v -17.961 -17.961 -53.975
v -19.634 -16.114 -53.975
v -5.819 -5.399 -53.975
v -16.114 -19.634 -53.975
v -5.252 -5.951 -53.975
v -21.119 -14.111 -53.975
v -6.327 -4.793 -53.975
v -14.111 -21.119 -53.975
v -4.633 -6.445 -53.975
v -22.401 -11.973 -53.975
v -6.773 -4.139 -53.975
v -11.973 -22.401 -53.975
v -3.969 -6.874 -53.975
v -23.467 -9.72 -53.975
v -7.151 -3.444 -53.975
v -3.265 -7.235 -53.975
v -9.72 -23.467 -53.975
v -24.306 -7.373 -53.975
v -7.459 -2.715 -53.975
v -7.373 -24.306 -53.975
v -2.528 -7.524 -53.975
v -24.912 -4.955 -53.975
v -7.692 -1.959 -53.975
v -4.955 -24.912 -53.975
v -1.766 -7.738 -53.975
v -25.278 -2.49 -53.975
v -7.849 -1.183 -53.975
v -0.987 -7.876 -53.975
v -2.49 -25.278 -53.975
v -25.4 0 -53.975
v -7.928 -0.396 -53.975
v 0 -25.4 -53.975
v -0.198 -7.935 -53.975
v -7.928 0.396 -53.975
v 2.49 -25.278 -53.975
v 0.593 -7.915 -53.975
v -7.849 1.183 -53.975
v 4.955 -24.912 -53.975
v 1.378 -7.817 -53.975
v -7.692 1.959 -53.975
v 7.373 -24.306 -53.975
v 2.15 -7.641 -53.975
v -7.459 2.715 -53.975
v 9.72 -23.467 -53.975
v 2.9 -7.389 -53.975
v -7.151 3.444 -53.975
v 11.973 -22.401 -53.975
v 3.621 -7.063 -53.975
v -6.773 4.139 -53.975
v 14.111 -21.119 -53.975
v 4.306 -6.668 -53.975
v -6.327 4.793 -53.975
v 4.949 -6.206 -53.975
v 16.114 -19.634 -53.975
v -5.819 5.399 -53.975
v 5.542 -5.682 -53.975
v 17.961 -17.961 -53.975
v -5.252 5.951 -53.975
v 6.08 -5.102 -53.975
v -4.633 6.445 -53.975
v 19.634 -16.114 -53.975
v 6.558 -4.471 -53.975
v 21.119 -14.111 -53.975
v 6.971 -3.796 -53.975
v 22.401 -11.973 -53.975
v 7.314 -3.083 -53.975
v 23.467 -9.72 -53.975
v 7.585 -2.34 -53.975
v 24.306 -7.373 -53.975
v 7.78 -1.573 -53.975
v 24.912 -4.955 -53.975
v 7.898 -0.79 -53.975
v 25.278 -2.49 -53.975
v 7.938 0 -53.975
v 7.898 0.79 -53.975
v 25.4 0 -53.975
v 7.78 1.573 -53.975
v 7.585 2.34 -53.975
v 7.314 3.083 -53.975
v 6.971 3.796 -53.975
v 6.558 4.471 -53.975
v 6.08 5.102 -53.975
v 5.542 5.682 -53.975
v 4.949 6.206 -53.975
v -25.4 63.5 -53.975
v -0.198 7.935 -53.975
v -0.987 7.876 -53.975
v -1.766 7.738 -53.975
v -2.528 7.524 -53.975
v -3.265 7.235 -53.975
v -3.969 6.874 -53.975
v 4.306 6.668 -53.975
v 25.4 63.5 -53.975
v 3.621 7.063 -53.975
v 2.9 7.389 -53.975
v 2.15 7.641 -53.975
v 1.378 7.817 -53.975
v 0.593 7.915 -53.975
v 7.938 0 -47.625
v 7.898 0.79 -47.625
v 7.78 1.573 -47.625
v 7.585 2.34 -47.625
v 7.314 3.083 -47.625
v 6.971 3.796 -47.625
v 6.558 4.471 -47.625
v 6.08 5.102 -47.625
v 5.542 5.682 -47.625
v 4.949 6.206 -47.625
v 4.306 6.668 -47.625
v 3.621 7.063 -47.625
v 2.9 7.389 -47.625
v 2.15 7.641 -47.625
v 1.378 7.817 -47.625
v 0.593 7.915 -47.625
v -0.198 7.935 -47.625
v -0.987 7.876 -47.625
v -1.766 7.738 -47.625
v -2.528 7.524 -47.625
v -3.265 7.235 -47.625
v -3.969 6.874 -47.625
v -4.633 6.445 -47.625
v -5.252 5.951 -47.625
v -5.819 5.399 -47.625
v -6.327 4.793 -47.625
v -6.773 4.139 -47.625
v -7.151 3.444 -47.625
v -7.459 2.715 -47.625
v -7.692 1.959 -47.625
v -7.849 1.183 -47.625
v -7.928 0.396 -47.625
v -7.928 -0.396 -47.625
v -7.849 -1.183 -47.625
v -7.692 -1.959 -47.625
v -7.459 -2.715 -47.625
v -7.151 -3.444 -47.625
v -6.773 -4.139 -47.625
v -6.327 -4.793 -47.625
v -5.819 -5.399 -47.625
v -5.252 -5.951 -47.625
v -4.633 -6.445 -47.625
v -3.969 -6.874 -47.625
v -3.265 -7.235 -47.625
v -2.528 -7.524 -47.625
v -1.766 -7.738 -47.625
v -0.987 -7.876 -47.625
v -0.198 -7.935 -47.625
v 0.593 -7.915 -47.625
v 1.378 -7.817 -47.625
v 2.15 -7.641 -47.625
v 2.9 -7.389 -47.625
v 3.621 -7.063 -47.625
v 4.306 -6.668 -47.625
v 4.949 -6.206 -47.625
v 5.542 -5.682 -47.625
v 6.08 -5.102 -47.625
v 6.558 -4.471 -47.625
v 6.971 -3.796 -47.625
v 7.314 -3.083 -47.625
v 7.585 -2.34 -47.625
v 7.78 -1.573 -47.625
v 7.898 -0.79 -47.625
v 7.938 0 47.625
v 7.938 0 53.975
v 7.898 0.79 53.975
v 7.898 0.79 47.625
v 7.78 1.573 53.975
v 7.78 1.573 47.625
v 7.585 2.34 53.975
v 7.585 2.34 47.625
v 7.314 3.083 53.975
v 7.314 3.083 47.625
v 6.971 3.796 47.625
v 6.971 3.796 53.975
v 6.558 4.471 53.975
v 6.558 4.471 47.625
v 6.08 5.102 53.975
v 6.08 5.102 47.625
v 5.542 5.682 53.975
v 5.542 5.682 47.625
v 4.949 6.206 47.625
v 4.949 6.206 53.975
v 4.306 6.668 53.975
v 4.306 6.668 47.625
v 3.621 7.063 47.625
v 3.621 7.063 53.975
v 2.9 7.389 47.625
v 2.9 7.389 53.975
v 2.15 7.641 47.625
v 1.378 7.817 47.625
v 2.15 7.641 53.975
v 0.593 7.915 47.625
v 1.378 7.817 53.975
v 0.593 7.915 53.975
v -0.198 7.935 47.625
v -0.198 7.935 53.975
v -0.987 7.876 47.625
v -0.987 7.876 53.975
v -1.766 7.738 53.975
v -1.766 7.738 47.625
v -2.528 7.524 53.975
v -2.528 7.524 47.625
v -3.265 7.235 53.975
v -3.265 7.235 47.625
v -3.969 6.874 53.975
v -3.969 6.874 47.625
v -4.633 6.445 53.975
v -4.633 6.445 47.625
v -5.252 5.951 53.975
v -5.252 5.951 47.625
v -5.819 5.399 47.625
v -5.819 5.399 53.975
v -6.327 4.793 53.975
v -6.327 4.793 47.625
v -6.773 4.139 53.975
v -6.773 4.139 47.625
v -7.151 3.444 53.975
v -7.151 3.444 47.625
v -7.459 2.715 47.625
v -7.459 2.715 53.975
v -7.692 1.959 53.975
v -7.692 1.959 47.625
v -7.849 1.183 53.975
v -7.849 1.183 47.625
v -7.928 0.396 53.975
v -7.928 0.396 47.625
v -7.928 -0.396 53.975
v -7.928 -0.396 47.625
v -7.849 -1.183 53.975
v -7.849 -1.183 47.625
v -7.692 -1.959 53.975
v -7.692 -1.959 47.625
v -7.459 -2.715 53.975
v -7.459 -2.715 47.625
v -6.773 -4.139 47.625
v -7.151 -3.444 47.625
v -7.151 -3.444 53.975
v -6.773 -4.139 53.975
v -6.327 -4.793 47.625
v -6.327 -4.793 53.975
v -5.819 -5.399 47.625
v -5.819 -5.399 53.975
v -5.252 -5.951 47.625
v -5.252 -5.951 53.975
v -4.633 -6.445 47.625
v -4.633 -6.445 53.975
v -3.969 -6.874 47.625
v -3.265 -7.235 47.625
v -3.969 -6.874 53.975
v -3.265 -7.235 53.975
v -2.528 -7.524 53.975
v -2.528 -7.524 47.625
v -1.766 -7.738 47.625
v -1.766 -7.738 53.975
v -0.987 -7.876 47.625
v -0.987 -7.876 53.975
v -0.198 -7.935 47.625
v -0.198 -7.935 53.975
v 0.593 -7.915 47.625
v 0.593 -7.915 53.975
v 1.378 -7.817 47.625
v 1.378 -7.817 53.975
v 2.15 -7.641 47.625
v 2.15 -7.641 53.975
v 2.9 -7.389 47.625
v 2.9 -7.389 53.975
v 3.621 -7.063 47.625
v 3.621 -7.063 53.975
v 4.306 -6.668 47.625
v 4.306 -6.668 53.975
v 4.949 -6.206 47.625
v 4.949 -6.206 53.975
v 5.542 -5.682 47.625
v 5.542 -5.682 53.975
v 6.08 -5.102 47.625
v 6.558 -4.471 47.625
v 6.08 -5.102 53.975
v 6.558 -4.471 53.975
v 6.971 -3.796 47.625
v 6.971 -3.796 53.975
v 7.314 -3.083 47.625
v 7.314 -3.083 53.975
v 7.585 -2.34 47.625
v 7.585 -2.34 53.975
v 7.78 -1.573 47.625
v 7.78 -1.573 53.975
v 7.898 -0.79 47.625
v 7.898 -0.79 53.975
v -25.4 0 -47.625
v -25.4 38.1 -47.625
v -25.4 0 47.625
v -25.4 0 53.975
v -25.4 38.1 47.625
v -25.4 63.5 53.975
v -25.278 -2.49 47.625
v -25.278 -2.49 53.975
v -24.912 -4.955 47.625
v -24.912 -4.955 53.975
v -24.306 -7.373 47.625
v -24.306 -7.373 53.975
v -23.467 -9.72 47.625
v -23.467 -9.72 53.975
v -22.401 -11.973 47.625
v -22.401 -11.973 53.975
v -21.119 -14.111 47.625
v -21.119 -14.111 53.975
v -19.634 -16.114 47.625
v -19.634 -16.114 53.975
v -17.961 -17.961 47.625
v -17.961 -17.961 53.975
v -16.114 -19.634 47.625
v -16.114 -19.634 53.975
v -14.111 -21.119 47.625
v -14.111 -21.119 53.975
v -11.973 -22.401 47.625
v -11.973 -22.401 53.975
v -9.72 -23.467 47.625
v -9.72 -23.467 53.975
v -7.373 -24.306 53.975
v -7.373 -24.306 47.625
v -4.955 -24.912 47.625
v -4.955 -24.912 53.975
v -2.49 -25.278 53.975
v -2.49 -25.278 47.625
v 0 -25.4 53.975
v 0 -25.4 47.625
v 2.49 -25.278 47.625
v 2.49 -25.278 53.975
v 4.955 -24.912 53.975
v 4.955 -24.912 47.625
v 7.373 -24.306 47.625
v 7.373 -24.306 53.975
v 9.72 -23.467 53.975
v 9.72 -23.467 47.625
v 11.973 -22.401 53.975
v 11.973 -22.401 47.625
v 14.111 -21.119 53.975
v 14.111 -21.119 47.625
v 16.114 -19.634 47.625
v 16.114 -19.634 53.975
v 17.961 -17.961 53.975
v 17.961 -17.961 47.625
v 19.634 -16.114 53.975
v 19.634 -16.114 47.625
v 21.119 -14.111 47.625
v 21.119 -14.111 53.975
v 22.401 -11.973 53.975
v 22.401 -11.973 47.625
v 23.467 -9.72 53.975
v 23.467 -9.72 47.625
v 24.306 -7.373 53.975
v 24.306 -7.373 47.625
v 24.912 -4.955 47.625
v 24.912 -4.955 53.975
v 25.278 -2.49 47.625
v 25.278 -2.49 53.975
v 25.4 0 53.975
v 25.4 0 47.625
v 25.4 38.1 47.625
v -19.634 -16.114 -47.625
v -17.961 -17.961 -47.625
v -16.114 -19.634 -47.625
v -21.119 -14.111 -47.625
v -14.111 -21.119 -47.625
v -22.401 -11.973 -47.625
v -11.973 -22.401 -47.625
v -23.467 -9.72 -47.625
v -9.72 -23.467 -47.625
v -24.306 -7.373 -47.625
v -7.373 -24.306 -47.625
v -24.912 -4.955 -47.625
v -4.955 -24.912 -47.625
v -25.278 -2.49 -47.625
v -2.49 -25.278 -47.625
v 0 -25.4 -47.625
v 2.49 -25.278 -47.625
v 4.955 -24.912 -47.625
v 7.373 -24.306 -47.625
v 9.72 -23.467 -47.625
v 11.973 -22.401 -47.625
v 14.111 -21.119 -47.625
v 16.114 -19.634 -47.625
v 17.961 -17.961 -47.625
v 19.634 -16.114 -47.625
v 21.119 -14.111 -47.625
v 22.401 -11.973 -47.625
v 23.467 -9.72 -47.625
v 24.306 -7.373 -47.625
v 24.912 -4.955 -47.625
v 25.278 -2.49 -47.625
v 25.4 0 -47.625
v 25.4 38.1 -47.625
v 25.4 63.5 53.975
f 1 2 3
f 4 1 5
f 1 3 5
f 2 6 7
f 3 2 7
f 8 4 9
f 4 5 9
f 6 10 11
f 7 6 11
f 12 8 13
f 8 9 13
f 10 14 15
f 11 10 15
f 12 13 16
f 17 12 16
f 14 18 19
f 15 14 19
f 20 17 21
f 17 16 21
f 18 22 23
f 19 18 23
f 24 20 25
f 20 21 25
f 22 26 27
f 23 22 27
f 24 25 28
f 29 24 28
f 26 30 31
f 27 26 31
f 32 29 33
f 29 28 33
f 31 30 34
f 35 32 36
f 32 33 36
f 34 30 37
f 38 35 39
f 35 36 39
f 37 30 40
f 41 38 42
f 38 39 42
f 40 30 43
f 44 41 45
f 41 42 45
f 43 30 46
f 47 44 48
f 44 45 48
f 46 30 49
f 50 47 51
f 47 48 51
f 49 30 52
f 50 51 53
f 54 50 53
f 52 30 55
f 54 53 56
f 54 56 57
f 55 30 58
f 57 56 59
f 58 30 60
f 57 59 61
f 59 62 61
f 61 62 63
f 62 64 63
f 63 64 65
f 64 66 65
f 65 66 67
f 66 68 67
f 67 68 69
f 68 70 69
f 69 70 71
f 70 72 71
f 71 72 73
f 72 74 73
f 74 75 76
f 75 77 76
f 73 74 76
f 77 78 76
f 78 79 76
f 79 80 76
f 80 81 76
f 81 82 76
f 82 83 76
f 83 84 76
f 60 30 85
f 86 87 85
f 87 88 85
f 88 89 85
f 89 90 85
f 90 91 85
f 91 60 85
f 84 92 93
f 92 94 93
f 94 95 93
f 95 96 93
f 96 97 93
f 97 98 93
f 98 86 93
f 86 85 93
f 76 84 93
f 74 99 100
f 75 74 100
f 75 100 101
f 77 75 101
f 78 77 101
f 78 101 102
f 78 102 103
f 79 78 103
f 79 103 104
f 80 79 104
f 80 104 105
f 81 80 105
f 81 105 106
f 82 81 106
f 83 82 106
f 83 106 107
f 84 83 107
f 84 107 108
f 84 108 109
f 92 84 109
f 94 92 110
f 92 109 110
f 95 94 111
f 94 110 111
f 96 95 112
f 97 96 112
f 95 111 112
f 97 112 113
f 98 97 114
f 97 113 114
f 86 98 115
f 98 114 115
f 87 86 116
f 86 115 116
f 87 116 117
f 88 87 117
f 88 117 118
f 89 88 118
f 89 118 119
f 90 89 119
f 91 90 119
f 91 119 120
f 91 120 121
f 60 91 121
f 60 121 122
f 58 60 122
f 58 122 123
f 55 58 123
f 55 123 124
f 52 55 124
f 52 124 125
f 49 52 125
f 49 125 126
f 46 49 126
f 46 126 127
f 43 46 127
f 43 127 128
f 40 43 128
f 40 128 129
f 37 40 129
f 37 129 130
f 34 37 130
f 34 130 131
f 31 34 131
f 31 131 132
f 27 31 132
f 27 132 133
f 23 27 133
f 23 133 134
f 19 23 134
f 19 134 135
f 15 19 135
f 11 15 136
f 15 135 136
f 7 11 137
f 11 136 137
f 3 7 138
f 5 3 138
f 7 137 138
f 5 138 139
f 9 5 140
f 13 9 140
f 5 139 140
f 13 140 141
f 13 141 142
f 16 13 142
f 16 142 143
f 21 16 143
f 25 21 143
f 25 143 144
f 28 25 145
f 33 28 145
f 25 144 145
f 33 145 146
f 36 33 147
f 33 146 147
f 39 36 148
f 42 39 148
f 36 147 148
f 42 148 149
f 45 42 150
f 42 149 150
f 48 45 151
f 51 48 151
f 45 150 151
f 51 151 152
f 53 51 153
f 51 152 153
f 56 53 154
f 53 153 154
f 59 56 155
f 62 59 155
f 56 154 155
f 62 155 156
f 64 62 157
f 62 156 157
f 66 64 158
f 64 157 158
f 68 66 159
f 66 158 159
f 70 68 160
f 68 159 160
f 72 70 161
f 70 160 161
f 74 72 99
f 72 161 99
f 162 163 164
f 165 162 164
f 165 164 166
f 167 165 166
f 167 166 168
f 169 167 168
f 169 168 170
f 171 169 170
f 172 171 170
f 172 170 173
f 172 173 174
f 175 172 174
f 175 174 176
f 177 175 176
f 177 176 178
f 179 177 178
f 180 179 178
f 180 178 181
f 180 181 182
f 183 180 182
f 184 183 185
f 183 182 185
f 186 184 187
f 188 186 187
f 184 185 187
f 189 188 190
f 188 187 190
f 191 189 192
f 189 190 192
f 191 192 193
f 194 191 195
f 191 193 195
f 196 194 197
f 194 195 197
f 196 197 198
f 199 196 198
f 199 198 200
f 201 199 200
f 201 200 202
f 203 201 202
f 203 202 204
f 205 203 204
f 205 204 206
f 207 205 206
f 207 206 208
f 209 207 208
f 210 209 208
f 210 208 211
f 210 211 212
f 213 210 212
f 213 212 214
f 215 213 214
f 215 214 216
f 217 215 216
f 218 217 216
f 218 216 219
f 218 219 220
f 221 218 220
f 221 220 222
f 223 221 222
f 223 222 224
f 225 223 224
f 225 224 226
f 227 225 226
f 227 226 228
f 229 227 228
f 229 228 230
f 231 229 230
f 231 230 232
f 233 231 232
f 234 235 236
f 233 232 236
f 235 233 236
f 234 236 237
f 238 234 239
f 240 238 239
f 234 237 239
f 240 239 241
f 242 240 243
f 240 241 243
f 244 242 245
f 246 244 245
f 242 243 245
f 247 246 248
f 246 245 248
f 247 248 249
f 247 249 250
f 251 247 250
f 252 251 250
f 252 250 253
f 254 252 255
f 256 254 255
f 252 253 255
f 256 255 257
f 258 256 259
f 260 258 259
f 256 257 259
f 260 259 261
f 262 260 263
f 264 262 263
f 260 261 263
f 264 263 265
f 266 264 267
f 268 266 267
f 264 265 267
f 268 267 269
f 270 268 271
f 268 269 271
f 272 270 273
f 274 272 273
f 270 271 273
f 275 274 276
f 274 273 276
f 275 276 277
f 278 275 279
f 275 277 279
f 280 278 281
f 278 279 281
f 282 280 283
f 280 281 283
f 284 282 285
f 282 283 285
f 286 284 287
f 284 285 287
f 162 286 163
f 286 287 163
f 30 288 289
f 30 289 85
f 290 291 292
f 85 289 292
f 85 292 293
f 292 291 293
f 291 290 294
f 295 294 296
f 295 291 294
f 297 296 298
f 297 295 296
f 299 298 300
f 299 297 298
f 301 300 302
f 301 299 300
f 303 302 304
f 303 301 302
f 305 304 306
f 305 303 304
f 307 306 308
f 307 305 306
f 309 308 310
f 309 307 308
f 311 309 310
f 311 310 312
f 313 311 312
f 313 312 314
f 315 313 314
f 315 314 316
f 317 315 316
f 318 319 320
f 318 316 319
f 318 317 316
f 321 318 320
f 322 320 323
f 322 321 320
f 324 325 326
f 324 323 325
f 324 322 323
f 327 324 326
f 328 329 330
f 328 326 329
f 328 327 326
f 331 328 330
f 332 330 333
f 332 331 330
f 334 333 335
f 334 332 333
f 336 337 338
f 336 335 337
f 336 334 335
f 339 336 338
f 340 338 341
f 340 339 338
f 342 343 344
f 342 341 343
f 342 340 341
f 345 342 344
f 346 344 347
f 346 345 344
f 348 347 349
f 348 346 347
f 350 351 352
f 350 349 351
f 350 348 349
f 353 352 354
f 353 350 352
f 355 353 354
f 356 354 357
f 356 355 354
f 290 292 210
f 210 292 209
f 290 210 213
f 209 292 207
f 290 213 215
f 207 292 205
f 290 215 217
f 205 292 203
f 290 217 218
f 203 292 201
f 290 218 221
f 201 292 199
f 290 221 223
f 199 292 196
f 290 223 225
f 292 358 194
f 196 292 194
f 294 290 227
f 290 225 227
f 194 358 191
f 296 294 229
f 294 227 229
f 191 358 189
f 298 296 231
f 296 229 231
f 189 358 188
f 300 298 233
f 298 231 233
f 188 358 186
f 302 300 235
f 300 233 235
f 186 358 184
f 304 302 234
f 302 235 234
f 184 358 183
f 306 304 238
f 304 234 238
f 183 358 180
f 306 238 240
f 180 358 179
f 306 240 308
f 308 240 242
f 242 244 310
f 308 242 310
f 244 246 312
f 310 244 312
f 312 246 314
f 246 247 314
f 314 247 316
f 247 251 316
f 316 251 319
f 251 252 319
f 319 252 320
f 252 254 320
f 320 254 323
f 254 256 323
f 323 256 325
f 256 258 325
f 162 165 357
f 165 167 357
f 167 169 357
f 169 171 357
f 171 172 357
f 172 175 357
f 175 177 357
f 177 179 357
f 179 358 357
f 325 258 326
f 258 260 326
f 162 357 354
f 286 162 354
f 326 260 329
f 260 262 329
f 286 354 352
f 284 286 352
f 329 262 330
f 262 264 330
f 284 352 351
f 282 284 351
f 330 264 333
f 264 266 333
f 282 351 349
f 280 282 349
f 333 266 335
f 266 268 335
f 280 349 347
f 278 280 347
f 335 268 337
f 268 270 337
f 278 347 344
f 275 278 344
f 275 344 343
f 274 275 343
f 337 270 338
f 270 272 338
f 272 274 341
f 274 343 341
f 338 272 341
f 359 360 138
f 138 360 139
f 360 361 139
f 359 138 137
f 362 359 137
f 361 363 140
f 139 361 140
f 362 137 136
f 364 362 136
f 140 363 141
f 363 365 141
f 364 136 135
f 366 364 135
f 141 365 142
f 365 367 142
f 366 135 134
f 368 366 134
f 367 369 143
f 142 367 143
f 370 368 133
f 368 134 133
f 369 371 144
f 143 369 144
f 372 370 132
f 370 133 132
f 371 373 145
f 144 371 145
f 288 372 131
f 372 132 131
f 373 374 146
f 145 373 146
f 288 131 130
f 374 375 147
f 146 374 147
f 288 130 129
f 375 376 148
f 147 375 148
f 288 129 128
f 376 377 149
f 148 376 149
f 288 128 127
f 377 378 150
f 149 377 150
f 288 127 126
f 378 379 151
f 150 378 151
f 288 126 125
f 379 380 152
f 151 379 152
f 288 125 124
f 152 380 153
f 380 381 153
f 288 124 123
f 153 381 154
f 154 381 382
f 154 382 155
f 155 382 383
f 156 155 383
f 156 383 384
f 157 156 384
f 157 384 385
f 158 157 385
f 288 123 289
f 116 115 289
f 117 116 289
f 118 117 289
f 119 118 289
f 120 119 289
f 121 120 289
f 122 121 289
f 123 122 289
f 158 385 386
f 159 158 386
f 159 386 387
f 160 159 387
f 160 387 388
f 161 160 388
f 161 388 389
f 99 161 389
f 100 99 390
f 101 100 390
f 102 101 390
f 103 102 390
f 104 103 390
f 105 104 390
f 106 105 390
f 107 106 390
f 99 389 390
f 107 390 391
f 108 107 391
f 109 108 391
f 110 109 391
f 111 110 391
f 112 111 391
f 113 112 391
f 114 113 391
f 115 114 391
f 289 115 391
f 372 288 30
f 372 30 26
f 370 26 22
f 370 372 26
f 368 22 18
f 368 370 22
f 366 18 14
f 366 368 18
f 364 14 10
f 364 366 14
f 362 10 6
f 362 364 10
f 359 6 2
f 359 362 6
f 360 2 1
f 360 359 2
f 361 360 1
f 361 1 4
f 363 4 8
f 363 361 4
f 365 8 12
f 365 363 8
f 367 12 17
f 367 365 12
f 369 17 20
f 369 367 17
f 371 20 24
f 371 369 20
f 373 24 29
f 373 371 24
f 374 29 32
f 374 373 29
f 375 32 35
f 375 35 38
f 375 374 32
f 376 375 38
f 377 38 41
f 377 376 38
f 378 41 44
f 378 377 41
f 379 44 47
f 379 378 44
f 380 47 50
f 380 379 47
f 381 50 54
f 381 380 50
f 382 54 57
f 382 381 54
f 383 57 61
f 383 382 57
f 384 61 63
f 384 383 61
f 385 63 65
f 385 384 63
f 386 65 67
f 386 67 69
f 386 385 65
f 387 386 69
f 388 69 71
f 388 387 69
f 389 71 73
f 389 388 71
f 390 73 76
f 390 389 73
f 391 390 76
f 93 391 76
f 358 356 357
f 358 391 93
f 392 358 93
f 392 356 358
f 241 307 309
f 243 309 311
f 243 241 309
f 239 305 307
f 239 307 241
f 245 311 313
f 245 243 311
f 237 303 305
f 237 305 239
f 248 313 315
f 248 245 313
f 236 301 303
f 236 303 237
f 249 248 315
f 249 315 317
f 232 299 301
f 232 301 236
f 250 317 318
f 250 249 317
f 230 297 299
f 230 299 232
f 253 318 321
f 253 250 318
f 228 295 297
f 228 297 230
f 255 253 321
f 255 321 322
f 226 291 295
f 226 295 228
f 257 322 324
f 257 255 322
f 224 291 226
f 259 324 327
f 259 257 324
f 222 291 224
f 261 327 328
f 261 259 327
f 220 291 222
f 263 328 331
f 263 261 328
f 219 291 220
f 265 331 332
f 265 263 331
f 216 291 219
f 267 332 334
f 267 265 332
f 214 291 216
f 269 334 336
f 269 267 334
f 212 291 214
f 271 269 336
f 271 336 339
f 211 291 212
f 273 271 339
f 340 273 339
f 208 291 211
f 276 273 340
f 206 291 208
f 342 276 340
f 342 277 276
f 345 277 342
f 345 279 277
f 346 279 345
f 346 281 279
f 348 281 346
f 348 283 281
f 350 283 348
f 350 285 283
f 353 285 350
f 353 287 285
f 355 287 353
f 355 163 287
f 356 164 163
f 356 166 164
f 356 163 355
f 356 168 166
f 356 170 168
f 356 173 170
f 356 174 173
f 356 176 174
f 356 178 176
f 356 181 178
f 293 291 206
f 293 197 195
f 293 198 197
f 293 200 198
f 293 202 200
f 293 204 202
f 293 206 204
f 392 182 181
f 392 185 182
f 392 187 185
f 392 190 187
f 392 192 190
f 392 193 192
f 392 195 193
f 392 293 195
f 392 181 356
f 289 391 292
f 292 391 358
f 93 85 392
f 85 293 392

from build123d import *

# Parameters (mm, degrees)
F0_W     = 50.8
F0_H     = 63.5
F1_DEPTH = 53.975
F3_DEPTH = 50.801
F4_R     = 7.9375
F5_DEPTH = 107.951


with BuildPart() as f1:
    # F0 (on Top) → F1 (new body, symmetric)
    with BuildSketch(Plane.XY):
        with Locations((0, 31.75)):
            Rectangle(F0_W, F0_H)
        with BuildLine():
            Line((25.4, 0), (-25.4, 0))
            ThreePointArc((-25.4, 0), (0, -25.4), (25.4, 0))
        make_face()
    extrude(amount=F1_DEPTH, both=True)

    # F2 (on face) → F3 (cut, through all)
    with BuildSketch(Plane.YZ.offset(25.4)):
        Polygon((0, 0), (0, 47.625), (-25.4, 47.625), (-25.4, -47.625), (0, -47.625), align=None)
        Polygon((38.1, -47.625), (38.1, 47.625), (0, 47.625), (0, 0), (0, -47.625), align=None)
    extrude(amount=-F3_DEPTH, mode=Mode.SUBTRACT)

    # F4 (on face) → F5 (cut, through all)
    with BuildSketch(Plane.XY.offset(53.975)):
        Circle(F4_R)
    extrude(amount=-F5_DEPTH, mode=Mode.SUBTRACT)


solid = f1.part
